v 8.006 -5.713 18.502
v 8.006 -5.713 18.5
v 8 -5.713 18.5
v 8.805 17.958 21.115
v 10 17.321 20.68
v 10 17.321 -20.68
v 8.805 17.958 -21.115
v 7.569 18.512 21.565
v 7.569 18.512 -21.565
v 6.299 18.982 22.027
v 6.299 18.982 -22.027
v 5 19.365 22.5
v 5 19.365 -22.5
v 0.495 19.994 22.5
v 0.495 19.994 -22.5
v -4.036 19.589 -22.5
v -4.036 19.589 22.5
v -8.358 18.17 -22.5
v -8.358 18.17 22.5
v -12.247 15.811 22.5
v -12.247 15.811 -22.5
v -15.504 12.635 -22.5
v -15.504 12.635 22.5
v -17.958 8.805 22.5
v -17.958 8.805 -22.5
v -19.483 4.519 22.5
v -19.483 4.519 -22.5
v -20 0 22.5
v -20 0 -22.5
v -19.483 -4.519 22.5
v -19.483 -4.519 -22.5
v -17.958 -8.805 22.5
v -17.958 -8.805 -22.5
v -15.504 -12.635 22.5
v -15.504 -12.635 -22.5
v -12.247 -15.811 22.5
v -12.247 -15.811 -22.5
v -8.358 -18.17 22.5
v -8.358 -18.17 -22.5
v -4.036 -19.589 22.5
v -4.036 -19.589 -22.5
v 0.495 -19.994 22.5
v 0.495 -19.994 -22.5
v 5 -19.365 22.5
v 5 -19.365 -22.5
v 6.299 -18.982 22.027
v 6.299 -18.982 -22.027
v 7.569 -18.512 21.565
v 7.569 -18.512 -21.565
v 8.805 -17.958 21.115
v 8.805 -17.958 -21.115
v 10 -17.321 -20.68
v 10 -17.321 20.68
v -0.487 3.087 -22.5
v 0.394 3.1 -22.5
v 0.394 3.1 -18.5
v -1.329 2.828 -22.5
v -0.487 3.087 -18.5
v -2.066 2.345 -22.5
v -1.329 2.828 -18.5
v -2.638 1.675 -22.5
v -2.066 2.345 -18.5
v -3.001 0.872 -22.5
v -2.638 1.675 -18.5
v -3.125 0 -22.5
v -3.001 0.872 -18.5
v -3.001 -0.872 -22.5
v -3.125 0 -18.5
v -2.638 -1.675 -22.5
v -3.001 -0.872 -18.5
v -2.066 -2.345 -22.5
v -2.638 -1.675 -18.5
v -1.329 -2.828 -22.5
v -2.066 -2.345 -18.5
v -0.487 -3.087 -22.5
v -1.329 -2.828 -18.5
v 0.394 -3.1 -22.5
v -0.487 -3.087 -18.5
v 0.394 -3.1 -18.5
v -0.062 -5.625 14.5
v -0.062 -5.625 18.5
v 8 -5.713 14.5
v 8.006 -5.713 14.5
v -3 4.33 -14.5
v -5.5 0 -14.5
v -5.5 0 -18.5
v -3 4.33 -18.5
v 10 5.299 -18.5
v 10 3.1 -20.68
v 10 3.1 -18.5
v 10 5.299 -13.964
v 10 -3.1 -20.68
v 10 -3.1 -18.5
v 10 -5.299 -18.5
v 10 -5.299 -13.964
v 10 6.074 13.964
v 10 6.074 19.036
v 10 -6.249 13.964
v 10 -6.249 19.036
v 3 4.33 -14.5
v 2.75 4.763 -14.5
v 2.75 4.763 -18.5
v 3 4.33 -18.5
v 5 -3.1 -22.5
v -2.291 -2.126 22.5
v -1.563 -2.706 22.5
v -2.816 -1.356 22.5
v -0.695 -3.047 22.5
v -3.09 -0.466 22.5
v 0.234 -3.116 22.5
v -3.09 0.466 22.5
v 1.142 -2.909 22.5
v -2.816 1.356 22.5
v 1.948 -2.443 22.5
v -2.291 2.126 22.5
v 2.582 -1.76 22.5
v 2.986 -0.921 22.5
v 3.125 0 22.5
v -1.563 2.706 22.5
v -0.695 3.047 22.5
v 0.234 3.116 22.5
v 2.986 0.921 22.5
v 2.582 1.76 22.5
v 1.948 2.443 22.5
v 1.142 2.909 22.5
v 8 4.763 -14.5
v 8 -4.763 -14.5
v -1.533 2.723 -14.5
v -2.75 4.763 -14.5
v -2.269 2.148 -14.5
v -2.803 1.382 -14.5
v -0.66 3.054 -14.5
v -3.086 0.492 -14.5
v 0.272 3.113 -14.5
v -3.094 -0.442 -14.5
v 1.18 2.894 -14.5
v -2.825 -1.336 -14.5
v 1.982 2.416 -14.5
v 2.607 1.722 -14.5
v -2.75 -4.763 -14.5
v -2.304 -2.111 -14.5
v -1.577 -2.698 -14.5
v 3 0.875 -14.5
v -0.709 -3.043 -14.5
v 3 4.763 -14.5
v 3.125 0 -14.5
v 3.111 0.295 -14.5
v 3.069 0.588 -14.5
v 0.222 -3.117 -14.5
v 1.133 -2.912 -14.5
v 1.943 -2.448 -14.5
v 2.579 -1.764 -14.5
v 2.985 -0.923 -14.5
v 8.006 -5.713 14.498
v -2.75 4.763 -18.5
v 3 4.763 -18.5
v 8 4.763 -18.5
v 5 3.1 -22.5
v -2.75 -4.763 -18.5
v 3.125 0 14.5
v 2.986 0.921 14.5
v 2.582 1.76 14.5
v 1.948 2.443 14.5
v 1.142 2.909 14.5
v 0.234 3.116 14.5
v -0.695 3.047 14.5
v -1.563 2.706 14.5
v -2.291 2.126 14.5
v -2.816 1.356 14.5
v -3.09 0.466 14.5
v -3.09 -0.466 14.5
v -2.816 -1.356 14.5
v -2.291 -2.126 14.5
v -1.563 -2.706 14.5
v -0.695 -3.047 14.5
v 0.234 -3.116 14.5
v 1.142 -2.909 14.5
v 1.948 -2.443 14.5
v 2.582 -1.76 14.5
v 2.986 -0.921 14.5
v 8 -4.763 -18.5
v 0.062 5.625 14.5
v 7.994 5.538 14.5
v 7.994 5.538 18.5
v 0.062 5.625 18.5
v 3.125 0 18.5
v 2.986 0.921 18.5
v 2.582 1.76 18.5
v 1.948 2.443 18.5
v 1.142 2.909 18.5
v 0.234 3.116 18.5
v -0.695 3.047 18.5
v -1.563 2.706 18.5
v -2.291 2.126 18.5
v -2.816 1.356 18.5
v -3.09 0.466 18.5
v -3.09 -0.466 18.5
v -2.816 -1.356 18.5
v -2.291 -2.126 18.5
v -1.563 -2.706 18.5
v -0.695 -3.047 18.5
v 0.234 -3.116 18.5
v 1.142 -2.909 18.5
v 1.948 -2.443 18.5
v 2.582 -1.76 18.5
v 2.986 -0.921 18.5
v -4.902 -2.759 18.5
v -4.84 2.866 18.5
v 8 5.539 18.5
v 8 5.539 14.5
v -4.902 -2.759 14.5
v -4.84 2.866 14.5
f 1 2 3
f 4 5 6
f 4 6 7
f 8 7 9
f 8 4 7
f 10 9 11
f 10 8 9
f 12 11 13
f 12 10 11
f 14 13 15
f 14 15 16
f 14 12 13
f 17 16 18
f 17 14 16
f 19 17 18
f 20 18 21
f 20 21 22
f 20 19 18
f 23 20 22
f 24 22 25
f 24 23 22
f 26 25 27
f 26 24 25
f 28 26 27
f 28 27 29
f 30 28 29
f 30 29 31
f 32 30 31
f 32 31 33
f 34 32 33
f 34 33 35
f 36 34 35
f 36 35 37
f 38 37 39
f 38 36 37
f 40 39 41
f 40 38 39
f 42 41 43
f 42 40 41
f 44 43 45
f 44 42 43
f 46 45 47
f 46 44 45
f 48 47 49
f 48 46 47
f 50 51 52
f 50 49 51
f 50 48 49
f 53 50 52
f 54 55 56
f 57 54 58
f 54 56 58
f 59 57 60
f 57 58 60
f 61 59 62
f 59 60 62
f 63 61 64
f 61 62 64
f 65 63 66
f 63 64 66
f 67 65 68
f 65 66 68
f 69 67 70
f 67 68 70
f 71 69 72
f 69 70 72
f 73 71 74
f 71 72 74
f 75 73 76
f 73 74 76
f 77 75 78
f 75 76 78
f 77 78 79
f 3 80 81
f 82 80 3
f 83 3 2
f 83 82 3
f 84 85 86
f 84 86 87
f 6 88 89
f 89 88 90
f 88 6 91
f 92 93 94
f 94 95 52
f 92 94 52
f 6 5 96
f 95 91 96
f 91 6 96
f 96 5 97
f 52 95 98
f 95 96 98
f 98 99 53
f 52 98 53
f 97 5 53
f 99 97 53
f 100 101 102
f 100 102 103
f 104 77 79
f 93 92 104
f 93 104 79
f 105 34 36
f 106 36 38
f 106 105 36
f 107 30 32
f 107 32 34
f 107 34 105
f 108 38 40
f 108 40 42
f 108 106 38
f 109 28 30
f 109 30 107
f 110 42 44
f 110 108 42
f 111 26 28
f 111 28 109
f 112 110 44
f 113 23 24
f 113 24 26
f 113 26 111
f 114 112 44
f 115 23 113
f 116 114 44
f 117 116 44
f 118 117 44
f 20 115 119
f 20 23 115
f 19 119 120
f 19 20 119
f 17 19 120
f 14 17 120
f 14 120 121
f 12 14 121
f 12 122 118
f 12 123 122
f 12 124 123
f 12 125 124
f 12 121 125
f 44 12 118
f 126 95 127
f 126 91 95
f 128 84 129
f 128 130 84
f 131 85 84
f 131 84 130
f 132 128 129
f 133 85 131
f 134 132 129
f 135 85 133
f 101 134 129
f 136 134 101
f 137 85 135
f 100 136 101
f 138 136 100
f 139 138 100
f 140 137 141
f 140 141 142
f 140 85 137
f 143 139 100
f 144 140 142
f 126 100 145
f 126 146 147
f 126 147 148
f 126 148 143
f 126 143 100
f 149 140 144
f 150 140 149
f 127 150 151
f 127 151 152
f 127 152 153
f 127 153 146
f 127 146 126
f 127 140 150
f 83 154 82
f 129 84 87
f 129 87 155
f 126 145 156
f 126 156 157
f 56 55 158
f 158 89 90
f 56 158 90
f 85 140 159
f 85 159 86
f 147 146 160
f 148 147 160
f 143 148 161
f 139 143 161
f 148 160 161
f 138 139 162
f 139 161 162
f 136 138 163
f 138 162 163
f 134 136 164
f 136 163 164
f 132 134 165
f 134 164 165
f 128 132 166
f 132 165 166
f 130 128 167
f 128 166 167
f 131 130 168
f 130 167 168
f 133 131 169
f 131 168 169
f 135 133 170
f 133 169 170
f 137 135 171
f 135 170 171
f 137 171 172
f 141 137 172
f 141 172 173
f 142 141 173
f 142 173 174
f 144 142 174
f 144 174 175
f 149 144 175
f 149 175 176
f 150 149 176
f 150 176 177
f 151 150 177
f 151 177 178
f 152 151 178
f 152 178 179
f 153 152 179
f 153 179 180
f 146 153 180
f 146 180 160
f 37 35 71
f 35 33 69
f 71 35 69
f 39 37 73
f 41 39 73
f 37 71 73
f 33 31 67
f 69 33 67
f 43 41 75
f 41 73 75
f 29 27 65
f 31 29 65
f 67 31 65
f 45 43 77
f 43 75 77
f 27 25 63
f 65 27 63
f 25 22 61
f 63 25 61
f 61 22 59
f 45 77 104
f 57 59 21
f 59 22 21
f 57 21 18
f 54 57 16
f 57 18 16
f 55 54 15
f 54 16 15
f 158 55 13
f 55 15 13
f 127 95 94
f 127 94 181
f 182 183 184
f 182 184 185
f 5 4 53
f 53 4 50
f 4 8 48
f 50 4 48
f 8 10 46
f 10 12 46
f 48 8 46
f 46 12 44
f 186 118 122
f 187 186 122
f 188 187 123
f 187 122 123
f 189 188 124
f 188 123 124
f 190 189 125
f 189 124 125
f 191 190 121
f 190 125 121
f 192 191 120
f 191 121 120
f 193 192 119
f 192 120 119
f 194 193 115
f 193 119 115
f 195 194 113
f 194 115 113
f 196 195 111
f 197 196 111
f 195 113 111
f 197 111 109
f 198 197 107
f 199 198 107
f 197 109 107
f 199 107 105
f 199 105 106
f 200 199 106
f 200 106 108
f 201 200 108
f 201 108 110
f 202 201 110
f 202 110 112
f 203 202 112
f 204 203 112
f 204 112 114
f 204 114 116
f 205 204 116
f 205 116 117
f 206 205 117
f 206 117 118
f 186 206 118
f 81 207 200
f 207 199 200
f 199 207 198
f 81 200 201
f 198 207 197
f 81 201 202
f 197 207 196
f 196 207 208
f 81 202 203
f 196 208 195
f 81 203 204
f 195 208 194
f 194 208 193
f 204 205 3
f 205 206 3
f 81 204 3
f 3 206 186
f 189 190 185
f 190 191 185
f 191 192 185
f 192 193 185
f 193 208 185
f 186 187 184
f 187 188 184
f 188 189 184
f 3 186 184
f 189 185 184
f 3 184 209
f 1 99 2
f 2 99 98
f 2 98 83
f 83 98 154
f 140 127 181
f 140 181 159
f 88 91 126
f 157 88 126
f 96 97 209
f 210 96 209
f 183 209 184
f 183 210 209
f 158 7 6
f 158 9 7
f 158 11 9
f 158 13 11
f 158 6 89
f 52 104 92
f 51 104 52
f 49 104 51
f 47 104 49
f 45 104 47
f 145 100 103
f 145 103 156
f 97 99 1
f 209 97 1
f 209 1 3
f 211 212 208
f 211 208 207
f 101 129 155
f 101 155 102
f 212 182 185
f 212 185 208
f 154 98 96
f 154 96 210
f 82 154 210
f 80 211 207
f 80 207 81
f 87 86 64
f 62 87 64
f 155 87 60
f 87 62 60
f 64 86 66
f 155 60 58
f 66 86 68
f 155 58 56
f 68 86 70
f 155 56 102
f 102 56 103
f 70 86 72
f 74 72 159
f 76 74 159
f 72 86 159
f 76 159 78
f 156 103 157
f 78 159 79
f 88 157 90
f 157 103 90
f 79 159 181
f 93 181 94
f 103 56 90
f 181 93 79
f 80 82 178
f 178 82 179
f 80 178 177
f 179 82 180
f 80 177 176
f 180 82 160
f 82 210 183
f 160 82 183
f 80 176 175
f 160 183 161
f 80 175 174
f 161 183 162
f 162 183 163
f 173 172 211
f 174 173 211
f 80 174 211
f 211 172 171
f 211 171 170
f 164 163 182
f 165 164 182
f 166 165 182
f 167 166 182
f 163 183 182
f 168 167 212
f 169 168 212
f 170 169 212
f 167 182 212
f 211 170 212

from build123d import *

# Parameters (mm, degrees)
F0_R          = 20
F1_DEPTH      = 22.5
F2_R          = 3.125
F3_DEPTH      = 4
F5_DEPTH      = 45.001
F9_DEPTH      = 4
F12_W         = 6.2
F12_H         = 4
F13_DEPTH     = 10
F14_SIZE2     = 5
F14_SIZE      = 1.8198511713
F15_T1_DEPTH  = 9.5262794416
F15_T3_DEPTH  = 4
F15_T5_DEPTH  = 4
F15_T10_DEPTH = 21.6375603763
F15_T16_DEPTH = 21.6375603763
F15_T23_DEPTH = 14.719722582
F15_T27_DEPTH = 9.1934431404
F15_T34_DEPTH = 9.1934431404
F15_T38_DEPTH = 14.719722582
F15_T45_DEPTH = 21.6375603763
F15_T49_DEPTH = 9.179576725
F15_T56_DEPTH = 21.6375603763
F15_T60_DEPTH = 9.2078904559
F15_T67_DEPTH = 9.2078904559
F15_T72_DEPTH = 21.6375603763
F15_T79_DEPTH = 9.179576725
F15_T84_DEPTH = 21.6375603763


# Not quite as in the source:
# - a fillet or chamfer that OpenCascade refuses, or shapes differently, is made with other operations: its cross-section is extruded or revolved along the edge and cut away or added


with BuildPart() as f1:
    # F0 (on Top) → F1 (new body, symmetric)
    with BuildSketch(Plane.XY):
        Circle(F0_R)
    extrude(amount=F1_DEPTH, both=True)


with BuildPart() as f3:
    # F2 (on face) → F3 (new body)
    with BuildSketch(Plane.XY.offset(22.5)):
        Polygon((4.8403136616, -2.8656567585), (4.9018883821, 2.759006214), (0.0615747205, 5.6246629725), (-4.8403136616, 2.8656567585), (-4.9018883821, -2.759006214), (-0.0615747205, -5.6246629725), align=None)
        Circle(F2_R, mode=Mode.SUBTRACT)
        Polygon((0.0615747205, 5.6246629725), (4.9018883821, 2.759006214), (4.8403136616, -2.8656567585), (-0.0615747205, -5.6246629725), (10, -5.7348097768), (10, 5.5158643187), align=None)
        Circle(F2_R)
    extrude(amount=F3_DEPTH)


with BuildPart() as f3b:
    # F2 (on face) → F3, piece 2 (new body)
    with BuildSketch(Plane.XY.offset(22.5)):
        with BuildLine():
            Line((49.1066566767, 5.0877530758), (19.2531154371, 5.4145679388))
            ThreePointArc((19.2531154371, 5.4145679388), (19.812399006, 2.7329188844), (20, 0))
            ThreePointArc((20, 0), (19.7812957099, -2.9496338823), (19.1299659961, -5.8347580061))
            Line((19.1299659961, -5.8347580061), (49.1066566767, -6.1629210197))
            Line((49.1066566767, -6.1629210197), (49.1066566767, 5.0877530758))
        make_face()
    extrude(amount=F3_DEPTH)


with BuildPart() as f3_1:
    # F4: moved
    add(f3.part.moved(Location((0, 0, -8))))


with BuildPart() as f5_tool:
    # F2 (on face) → F5 (new body, through all)
    with BuildSketch(Plane.XY.offset(22.5)):
        Circle(F2_R)
        with BuildLine():
            Line((10, 17.3205080757), (10, 5.5158643187))
            Line((10, 5.5158643187), (19.2531154371, 5.4145679388))
            ThreePointArc((19.2531154371, 5.4145679388), (15.7915814069, 12.2729766833), (10, 17.3205080757))
        make_face()
        with BuildLine():
            Line((19.2531154371, 5.4145679388), (10, 5.5158643187))
            Line((10, 5.5158643187), (10, -5.7348097768))
            Line((10, -5.7348097768), (19.1299659961, -5.8347580061))
            ThreePointArc((19.1299659961, -5.8347580061), (19.7812957099, -2.9496338823), (20, 0))
            ThreePointArc((20, 0), (19.812399006, 2.7329188844), (19.2531154371, 5.4145679388))
        make_face()
        with BuildLine():
            Line((19.1299659961, -5.8347580061), (10, -5.7348097768))
            Line((10, -5.7348097768), (10, -17.3205080757))
            ThreePointArc((10, -17.3205080757), (15.6562876634, -12.4451057288), (19.1299659961, -5.8347580061))
        make_face()
    extrude(amount=-F5_DEPTH)


with BuildPart() as f1_1:
    add(f1.part)

    # F5: cut by f5_tool
    add(f5_tool.part, mode=Mode.SUBTRACT)


with BuildPart() as f3_2:
    add(f3_1.part)

    # F5: cut by f5_tool
    add(f5_tool.part, mode=Mode.SUBTRACT)


with BuildPart() as f1_2:
    add(f1_1.part)

    # F7: cut F3
    add(f3_2.part, mode=Mode.SUBTRACT)


with BuildPart() as f9:
    # F8 (on face) → F9 (new body)
    with BuildSketch(Plane(origin=(0, 0, -22.5), x_dir=(1, 0, 0), z_dir=(0, 0, -1))):
        Polygon((22.1706703305, 4.7631397208), (10, 4.7631397208), (10, -4.7631397208), (22.864067927, -4.7631397208), align=None)
        Polygon((2.75, 4.7631397208), (5.5, 0), (3, -4.3301270189), (3, -4.7631397208), (10, -4.7631397208), (10, 4.7631397208), align=None)
        with BuildLine():
            Line((3, -4.3301270189), (5.5, 0))
            Line((5.5, 0), (2.75, 4.7631397208))
            Line((2.75, 4.7631397208), (-2.75, 4.7631397208))
            Line((-2.75, 4.7631397208), (-5.5, 0))
            Line((-5.5, 0), (-3, -4.3301270189))
            Line((-3, -4.3301270189), (-3, -0.875))
            ThreePointArc((-3, -0.875), (-0.4419417382, 3.0935921677), (3.125, 0))
            ThreePointArc((3.125, 0), (3.0935921677, -0.4419417382), (3, -0.875))
            Line((3, -0.875), (3, -4.3301270189))
        make_face()
        with BuildLine():
            Line((2.75, -4.7631397208), (3, -4.3301270189))
            Line((3, -4.3301270189), (3, -0.875))
            ThreePointArc((3, -0.875), (0, -3.125), (-3, -0.875))
            Line((-3, -0.875), (-3, -4.3301270189))
            Line((-3, -4.3301270189), (-2.75, -4.7631397208))
            Line((-2.75, -4.7631397208), (2.75, -4.7631397208))
        make_face()
    extrude(amount=F9_DEPTH)


with BuildPart() as f9_1:
    # F10: moved
    add(f9.part.moved(Location((0, 0, 8))))


with BuildPart() as f1_3:
    add(f1_2.part)

    # F11: cut F9
    add(f9_1.part, mode=Mode.SUBTRACT)

    # F12 (on face) → F13 (cut)
    with BuildSketch(Plane.YZ.offset(10)):
        with Locations((0, -20.5)):
            Rectangle(F12_W, F12_H)
    extrude(amount=-F13_DEPTH, mode=Mode.SUBTRACT)

    # F14
    f14_edges = [f1_3.edges().sort_by_distance(p)[0] for p in [
        (10, -10.210254, -22.5),
        (10, 10.210254, -22.5),
        (10, 0, 22.5),
    ]]
    f14_side = f1_3.faces().sort_by_distance((10, 0.003395, 0.271955))[0]
    chamfer(f14_edges, length=F14_SIZE, length2=F14_SIZE2, reference=f14_side)

    # F15: chamfer of 2 x 0.5358983849 on 7 edges, made by hand

    # F15_s2 → F15_t1 (cut)
    with BuildSketch(Plane.XZ.offset(-4.7631397208)):
        Polygon((10, -13.9641016151), (8, -14.5), (10, -14.5), align=None)
    extrude(amount=F15_T1_DEPTH, mode=Mode.SUBTRACT)

    # F15_s4 → F15_t3 (cut)
    with BuildSketch(Plane.XY.offset(14.5)):
        Polygon((10, 6.0736893602), (7.9941337256, 5.5378230842), (10, 5.5158643187), align=None)
        Polygon((10, -6.2488457266), (8.0058662744, -5.7129794507), (10, -5.7348097768), align=None)
    extrude(amount=F15_T3_DEPTH, mode=Mode.SUBTRACT)

    # F15_s6 → F15_t5 (cut)
    with BuildSketch(Plane.XY.offset(-18.5)):
        Polygon((10, -5.2990381057), (8, -4.7631397208), (10, -4.7631397208), align=None)
        Polygon((10, 5.2990381057), (8, 4.7631397208), (10, 4.7631397208), align=None)
    extrude(amount=F15_T5_DEPTH, mode=Mode.SUBTRACT)


with BuildPart() as f15_tool8:
    # F15_s9 → F15_t10 (new body)
    with BuildSketch(Plane.XZ.offset(10.9282529172)):
        Polygon((10, 13.9641016151), (8, 14.5), (10, 14.5), align=None)
    extrude(amount=-F15_T10_DEPTH)

    split(bisect_by=Plane(origin=(-0.0615747205, -5.6246629725, 0), x_dir=(0, 0, 1), z_dir=(0.010946617, 0.999940084, 0)), keep=Keep.TOP)

    split(bisect_by=Plane(origin=(0.0615747205, 5.6246629725, 0), x_dir=(0, 0, 1), z_dir=(-0.010946617, -0.999940084, 0)), keep=Keep.TOP)


with BuildPart() as f1_4:
    add(f1_3.part)

    # F15_t7: cut F15_tool8
    add(f15_tool8.part, mode=Mode.SUBTRACT)


with BuildPart() as f15_tool14:
    # F15_s15 → F15_t16 (new body)
    with BuildSketch(Plane.XZ.offset(10.9282529172)):
        Polygon((10, 19.0358983849), (8, 18.5), (10, 18.5), align=None)
    extrude(amount=-F15_T16_DEPTH)

    split(bisect_by=Plane(origin=(-0.0615747205, -5.6246629725, 0), x_dir=(0, 0, 1), z_dir=(0.010946617, 0.999940084, 0)), keep=Keep.TOP)

    split(bisect_by=Plane(origin=(0.0615747205, 5.6246629725, 0), x_dir=(0, 0, 1), z_dir=(-0.010946617, -0.999940084, 0)), keep=Keep.TOP)


with BuildPart() as f1_5:
    add(f1_4.part)

    # F15_t13: cut F15_tool14
    add(f15_tool14.part, mode=Mode.SUBTRACT)


with BuildPart() as f15_tool21:
    # F15_s22 → F15_t23 (new body)
    with BuildSketch(Plane.XZ.offset(-9.9565828612)):
        Polygon((10, -13.9641016151), (8, -14.5), (10, -14.5), align=None)
    extrude(amount=F15_T23_DEPTH)

    split(bisect_by=Plane.XZ.offset(-4.7631397208), keep=Keep.BOTTOM)


with BuildPart() as f15_tool25:
    # F15_s26 → F15_t27 (new body)
    with BuildSketch(Plane.XY.offset(-18.5)):
        Polygon((10, 5.2990381057), (8, 4.7631397208), (10, 4.7631397208), align=None)
    extrude(amount=F15_T27_DEPTH)

    split(bisect_by=Plane.XY.offset(-14.5), keep=Keep.TOP)


with BuildPart() as f15_tool21_1:
    add(f15_tool21.part)

    # F15_t29: intersect F15_tool25
    add(f15_tool25.part, mode=Mode.INTERSECT)


with BuildPart() as f1_6:
    add(f1_5.part)

    # F15_t19: cut F15_tool21
    add(f15_tool21_1.part, mode=Mode.SUBTRACT)


with BuildPart() as f15_tool32:
    # F15_s33 → F15_t34 (new body)
    with BuildSketch(Plane.XY.offset(-9.3065568596)):
        Polygon((10, -5.2990381057), (8, -4.7631397208), (10, -4.7631397208), align=None)
    extrude(amount=-F15_T34_DEPTH)

    split(bisect_by=Plane.XY.offset(-14.5), keep=Keep.TOP)


with BuildPart() as f15_tool36:
    # F15_s37 → F15_t38 (new body)
    with BuildSketch(Plane.XZ.offset(-4.7631397208)):
        Polygon((10, -13.9641016151), (8, -14.5), (10, -14.5), align=None)
    extrude(amount=F15_T38_DEPTH)

    split(bisect_by=Plane.XZ.offset(4.7631397208), keep=Keep.TOP)


with BuildPart() as f15_tool32_1:
    add(f15_tool32.part)

    # F15_t40: intersect F15_tool36
    add(f15_tool36.part, mode=Mode.INTERSECT)


with BuildPart() as f1_7:
    add(f1_6.part)

    # F15_t30: cut F15_tool32
    add(f15_tool32_1.part, mode=Mode.SUBTRACT)


with BuildPart() as f15_tool43:
    # F15_s44 → F15_t45 (new body)
    with BuildSketch(Plane.XZ.offset(10.9282529172)):
        Polygon((10, 13.9641016151), (8, 14.5), (10, 14.5), align=None)
    extrude(amount=-F15_T45_DEPTH)

    split(bisect_by=Plane(origin=(-0.0615747205, -5.6246629725, 0), x_dir=(0, 0, 1), z_dir=(-0.010946617, -0.999940084, 0)), keep=Keep.TOP)


with BuildPart() as f15_tool47:
    # F15_s48 → F15_t49 (new body)
    with BuildSketch(Plane.XY.offset(9.320423275)):
        Polygon((10, -6.2488457266), (8.0058662744, -5.7129794507), (10, -5.7348097768), align=None)
    extrude(amount=F15_T49_DEPTH)

    split(bisect_by=Plane.XY.offset(14.5), keep=Keep.BOTTOM)


with BuildPart() as f15_tool43_1:
    add(f15_tool43.part)

    # F15_t51: intersect F15_tool47
    add(f15_tool47.part, mode=Mode.INTERSECT)


with BuildPart() as f1_8:
    add(f1_7.part)

    # F15_t41: cut F15_tool43
    add(f15_tool43_1.part, mode=Mode.SUBTRACT)


with BuildPart() as f15_tool54:
    # F15_s55 → F15_t56 (new body)
    with BuildSketch(Plane.XZ.offset(10.9282529172)):
        Polygon((10, 13.9641016151), (8, 14.5), (10, 14.5), align=None)
    extrude(amount=-F15_T56_DEPTH)

    split(bisect_by=Plane(origin=(0.0615747205, 5.6246629725, 0), x_dir=(0, 0, 1), z_dir=(0.010946617, 0.999940084, 0)), keep=Keep.TOP)


with BuildPart() as f15_tool58:
    # F15_s59 → F15_t60 (new body)
    with BuildSketch(Plane.XY.offset(9.2921095441)):
        Polygon((10, 6.0736893602), (7.9941337256, 5.5378230842), (10, 5.5158643187), align=None)
    extrude(amount=F15_T60_DEPTH)

    split(bisect_by=Plane.XY.offset(14.5), keep=Keep.BOTTOM)


with BuildPart() as f15_tool54_1:
    add(f15_tool54.part)

    # F15_t62: intersect F15_tool58
    add(f15_tool58.part, mode=Mode.INTERSECT)


with BuildPart() as f1_9:
    add(f1_8.part)

    # F15_t52: cut F15_tool54
    add(f15_tool54_1.part, mode=Mode.SUBTRACT)


with BuildPart() as f15_tool65:
    # F15_s66 → F15_t67 (new body)
    with BuildSketch(Plane.XY.offset(14.5)):
        Polygon((10, 6.0736893602), (7.9941337256, 5.5378230842), (10, 5.5158643187), align=None)
    extrude(amount=F15_T67_DEPTH)

    split(bisect_by=Plane(origin=(7.8162495012, 0, 21.4749690093), x_dir=(0, 1, 0), z_dir=(-0.3420201433, 0, -0.9396926208)), keep=Keep.TOP)

    split(bisect_by=Plane.XY.offset(18.5), keep=Keep.TOP)


with BuildPart() as f15_tool70:
    # F15_s71 → F15_t72 (new body)
    with BuildSketch(Plane.XZ.offset(10.9282529172)):
        Polygon((10, 19.0358983849), (8, 18.5), (10, 18.5), align=None)
    extrude(amount=-F15_T72_DEPTH)

    split(bisect_by=Plane(origin=(0.0615747205, 5.6246629725, 0), x_dir=(0, 0, 1), z_dir=(0.010946617, 0.999940084, 0)), keep=Keep.TOP)


with BuildPart() as f15_tool65_1:
    add(f15_tool65.part)

    # F15_t74: intersect F15_tool70
    add(f15_tool70.part, mode=Mode.INTERSECT)


with BuildPart() as f1_10:
    add(f1_9.part)

    # F15_t63: cut F15_tool65
    add(f15_tool65_1.part, mode=Mode.SUBTRACT)


with BuildPart() as f15_tool77:
    # F15_s78 → F15_t79 (new body)
    with BuildSketch(Plane.XY.offset(14.5)):
        Polygon((10, -6.2488457266), (8.0058662744, -5.7129794507), (10, -5.7348097768), align=None)
    extrude(amount=F15_T79_DEPTH)

    split(bisect_by=Plane(origin=(7.8162495012, 0, 21.4749690093), x_dir=(0, 1, 0), z_dir=(-0.3420201433, 0, -0.9396926208)), keep=Keep.TOP)

    split(bisect_by=Plane.XY.offset(18.5), keep=Keep.TOP)


with BuildPart() as f15_tool82:
    # F15_s83 → F15_t84 (new body)
    with BuildSketch(Plane.XZ.offset(10.9282529172)):
        Polygon((10, 19.0358983849), (8, 18.5), (10, 18.5), align=None)
    extrude(amount=-F15_T84_DEPTH)

    split(bisect_by=Plane(origin=(-0.0615747205, -5.6246629725, 0), x_dir=(0, 0, 1), z_dir=(-0.010946617, -0.999940084, 0)), keep=Keep.TOP)


with BuildPart() as f15_tool77_1:
    add(f15_tool77.part)

    # F15_t86: intersect F15_tool82
    add(f15_tool82.part, mode=Mode.INTERSECT)


with BuildPart() as f1_11:
    add(f1_10.part)

    # F15_t75: cut F15_tool77
    add(f15_tool77_1.part, mode=Mode.SUBTRACT)


solid = f1_11.part
